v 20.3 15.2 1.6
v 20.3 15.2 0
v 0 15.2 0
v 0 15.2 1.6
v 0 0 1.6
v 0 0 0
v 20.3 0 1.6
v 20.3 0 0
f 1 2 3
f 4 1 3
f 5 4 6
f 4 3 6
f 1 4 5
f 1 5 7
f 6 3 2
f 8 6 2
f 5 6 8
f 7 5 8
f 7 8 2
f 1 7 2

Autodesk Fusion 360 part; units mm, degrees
sketch "Szkic1" plane through (0, 0, 0) normal (0, 0, 1) x (1, 0, 0)
  line L0 (0, 0) -> (20.3, 0)
  line L1 (20.3, 0) -> (20.3, 15.2)
  line L2 (20.3, 15.2) -> (0, 15.2)
  line L3 (0, 15.2) -> (0, 0)
  dimension "d1" = 20.3
  dimension "d2" = 15.2
extrude "Wyciągnięcie proste1" add sketch "Szkic1" along normal blind 1.6 makes body 1
copy_body "Bryła->Komponent1" bodies 1 removing the originals makes body 2 in component "Component"
component "Component" placed x (1, 0, 0) y (0, 1, 0) z (0, 0, 1) at (0, 0, 0)
